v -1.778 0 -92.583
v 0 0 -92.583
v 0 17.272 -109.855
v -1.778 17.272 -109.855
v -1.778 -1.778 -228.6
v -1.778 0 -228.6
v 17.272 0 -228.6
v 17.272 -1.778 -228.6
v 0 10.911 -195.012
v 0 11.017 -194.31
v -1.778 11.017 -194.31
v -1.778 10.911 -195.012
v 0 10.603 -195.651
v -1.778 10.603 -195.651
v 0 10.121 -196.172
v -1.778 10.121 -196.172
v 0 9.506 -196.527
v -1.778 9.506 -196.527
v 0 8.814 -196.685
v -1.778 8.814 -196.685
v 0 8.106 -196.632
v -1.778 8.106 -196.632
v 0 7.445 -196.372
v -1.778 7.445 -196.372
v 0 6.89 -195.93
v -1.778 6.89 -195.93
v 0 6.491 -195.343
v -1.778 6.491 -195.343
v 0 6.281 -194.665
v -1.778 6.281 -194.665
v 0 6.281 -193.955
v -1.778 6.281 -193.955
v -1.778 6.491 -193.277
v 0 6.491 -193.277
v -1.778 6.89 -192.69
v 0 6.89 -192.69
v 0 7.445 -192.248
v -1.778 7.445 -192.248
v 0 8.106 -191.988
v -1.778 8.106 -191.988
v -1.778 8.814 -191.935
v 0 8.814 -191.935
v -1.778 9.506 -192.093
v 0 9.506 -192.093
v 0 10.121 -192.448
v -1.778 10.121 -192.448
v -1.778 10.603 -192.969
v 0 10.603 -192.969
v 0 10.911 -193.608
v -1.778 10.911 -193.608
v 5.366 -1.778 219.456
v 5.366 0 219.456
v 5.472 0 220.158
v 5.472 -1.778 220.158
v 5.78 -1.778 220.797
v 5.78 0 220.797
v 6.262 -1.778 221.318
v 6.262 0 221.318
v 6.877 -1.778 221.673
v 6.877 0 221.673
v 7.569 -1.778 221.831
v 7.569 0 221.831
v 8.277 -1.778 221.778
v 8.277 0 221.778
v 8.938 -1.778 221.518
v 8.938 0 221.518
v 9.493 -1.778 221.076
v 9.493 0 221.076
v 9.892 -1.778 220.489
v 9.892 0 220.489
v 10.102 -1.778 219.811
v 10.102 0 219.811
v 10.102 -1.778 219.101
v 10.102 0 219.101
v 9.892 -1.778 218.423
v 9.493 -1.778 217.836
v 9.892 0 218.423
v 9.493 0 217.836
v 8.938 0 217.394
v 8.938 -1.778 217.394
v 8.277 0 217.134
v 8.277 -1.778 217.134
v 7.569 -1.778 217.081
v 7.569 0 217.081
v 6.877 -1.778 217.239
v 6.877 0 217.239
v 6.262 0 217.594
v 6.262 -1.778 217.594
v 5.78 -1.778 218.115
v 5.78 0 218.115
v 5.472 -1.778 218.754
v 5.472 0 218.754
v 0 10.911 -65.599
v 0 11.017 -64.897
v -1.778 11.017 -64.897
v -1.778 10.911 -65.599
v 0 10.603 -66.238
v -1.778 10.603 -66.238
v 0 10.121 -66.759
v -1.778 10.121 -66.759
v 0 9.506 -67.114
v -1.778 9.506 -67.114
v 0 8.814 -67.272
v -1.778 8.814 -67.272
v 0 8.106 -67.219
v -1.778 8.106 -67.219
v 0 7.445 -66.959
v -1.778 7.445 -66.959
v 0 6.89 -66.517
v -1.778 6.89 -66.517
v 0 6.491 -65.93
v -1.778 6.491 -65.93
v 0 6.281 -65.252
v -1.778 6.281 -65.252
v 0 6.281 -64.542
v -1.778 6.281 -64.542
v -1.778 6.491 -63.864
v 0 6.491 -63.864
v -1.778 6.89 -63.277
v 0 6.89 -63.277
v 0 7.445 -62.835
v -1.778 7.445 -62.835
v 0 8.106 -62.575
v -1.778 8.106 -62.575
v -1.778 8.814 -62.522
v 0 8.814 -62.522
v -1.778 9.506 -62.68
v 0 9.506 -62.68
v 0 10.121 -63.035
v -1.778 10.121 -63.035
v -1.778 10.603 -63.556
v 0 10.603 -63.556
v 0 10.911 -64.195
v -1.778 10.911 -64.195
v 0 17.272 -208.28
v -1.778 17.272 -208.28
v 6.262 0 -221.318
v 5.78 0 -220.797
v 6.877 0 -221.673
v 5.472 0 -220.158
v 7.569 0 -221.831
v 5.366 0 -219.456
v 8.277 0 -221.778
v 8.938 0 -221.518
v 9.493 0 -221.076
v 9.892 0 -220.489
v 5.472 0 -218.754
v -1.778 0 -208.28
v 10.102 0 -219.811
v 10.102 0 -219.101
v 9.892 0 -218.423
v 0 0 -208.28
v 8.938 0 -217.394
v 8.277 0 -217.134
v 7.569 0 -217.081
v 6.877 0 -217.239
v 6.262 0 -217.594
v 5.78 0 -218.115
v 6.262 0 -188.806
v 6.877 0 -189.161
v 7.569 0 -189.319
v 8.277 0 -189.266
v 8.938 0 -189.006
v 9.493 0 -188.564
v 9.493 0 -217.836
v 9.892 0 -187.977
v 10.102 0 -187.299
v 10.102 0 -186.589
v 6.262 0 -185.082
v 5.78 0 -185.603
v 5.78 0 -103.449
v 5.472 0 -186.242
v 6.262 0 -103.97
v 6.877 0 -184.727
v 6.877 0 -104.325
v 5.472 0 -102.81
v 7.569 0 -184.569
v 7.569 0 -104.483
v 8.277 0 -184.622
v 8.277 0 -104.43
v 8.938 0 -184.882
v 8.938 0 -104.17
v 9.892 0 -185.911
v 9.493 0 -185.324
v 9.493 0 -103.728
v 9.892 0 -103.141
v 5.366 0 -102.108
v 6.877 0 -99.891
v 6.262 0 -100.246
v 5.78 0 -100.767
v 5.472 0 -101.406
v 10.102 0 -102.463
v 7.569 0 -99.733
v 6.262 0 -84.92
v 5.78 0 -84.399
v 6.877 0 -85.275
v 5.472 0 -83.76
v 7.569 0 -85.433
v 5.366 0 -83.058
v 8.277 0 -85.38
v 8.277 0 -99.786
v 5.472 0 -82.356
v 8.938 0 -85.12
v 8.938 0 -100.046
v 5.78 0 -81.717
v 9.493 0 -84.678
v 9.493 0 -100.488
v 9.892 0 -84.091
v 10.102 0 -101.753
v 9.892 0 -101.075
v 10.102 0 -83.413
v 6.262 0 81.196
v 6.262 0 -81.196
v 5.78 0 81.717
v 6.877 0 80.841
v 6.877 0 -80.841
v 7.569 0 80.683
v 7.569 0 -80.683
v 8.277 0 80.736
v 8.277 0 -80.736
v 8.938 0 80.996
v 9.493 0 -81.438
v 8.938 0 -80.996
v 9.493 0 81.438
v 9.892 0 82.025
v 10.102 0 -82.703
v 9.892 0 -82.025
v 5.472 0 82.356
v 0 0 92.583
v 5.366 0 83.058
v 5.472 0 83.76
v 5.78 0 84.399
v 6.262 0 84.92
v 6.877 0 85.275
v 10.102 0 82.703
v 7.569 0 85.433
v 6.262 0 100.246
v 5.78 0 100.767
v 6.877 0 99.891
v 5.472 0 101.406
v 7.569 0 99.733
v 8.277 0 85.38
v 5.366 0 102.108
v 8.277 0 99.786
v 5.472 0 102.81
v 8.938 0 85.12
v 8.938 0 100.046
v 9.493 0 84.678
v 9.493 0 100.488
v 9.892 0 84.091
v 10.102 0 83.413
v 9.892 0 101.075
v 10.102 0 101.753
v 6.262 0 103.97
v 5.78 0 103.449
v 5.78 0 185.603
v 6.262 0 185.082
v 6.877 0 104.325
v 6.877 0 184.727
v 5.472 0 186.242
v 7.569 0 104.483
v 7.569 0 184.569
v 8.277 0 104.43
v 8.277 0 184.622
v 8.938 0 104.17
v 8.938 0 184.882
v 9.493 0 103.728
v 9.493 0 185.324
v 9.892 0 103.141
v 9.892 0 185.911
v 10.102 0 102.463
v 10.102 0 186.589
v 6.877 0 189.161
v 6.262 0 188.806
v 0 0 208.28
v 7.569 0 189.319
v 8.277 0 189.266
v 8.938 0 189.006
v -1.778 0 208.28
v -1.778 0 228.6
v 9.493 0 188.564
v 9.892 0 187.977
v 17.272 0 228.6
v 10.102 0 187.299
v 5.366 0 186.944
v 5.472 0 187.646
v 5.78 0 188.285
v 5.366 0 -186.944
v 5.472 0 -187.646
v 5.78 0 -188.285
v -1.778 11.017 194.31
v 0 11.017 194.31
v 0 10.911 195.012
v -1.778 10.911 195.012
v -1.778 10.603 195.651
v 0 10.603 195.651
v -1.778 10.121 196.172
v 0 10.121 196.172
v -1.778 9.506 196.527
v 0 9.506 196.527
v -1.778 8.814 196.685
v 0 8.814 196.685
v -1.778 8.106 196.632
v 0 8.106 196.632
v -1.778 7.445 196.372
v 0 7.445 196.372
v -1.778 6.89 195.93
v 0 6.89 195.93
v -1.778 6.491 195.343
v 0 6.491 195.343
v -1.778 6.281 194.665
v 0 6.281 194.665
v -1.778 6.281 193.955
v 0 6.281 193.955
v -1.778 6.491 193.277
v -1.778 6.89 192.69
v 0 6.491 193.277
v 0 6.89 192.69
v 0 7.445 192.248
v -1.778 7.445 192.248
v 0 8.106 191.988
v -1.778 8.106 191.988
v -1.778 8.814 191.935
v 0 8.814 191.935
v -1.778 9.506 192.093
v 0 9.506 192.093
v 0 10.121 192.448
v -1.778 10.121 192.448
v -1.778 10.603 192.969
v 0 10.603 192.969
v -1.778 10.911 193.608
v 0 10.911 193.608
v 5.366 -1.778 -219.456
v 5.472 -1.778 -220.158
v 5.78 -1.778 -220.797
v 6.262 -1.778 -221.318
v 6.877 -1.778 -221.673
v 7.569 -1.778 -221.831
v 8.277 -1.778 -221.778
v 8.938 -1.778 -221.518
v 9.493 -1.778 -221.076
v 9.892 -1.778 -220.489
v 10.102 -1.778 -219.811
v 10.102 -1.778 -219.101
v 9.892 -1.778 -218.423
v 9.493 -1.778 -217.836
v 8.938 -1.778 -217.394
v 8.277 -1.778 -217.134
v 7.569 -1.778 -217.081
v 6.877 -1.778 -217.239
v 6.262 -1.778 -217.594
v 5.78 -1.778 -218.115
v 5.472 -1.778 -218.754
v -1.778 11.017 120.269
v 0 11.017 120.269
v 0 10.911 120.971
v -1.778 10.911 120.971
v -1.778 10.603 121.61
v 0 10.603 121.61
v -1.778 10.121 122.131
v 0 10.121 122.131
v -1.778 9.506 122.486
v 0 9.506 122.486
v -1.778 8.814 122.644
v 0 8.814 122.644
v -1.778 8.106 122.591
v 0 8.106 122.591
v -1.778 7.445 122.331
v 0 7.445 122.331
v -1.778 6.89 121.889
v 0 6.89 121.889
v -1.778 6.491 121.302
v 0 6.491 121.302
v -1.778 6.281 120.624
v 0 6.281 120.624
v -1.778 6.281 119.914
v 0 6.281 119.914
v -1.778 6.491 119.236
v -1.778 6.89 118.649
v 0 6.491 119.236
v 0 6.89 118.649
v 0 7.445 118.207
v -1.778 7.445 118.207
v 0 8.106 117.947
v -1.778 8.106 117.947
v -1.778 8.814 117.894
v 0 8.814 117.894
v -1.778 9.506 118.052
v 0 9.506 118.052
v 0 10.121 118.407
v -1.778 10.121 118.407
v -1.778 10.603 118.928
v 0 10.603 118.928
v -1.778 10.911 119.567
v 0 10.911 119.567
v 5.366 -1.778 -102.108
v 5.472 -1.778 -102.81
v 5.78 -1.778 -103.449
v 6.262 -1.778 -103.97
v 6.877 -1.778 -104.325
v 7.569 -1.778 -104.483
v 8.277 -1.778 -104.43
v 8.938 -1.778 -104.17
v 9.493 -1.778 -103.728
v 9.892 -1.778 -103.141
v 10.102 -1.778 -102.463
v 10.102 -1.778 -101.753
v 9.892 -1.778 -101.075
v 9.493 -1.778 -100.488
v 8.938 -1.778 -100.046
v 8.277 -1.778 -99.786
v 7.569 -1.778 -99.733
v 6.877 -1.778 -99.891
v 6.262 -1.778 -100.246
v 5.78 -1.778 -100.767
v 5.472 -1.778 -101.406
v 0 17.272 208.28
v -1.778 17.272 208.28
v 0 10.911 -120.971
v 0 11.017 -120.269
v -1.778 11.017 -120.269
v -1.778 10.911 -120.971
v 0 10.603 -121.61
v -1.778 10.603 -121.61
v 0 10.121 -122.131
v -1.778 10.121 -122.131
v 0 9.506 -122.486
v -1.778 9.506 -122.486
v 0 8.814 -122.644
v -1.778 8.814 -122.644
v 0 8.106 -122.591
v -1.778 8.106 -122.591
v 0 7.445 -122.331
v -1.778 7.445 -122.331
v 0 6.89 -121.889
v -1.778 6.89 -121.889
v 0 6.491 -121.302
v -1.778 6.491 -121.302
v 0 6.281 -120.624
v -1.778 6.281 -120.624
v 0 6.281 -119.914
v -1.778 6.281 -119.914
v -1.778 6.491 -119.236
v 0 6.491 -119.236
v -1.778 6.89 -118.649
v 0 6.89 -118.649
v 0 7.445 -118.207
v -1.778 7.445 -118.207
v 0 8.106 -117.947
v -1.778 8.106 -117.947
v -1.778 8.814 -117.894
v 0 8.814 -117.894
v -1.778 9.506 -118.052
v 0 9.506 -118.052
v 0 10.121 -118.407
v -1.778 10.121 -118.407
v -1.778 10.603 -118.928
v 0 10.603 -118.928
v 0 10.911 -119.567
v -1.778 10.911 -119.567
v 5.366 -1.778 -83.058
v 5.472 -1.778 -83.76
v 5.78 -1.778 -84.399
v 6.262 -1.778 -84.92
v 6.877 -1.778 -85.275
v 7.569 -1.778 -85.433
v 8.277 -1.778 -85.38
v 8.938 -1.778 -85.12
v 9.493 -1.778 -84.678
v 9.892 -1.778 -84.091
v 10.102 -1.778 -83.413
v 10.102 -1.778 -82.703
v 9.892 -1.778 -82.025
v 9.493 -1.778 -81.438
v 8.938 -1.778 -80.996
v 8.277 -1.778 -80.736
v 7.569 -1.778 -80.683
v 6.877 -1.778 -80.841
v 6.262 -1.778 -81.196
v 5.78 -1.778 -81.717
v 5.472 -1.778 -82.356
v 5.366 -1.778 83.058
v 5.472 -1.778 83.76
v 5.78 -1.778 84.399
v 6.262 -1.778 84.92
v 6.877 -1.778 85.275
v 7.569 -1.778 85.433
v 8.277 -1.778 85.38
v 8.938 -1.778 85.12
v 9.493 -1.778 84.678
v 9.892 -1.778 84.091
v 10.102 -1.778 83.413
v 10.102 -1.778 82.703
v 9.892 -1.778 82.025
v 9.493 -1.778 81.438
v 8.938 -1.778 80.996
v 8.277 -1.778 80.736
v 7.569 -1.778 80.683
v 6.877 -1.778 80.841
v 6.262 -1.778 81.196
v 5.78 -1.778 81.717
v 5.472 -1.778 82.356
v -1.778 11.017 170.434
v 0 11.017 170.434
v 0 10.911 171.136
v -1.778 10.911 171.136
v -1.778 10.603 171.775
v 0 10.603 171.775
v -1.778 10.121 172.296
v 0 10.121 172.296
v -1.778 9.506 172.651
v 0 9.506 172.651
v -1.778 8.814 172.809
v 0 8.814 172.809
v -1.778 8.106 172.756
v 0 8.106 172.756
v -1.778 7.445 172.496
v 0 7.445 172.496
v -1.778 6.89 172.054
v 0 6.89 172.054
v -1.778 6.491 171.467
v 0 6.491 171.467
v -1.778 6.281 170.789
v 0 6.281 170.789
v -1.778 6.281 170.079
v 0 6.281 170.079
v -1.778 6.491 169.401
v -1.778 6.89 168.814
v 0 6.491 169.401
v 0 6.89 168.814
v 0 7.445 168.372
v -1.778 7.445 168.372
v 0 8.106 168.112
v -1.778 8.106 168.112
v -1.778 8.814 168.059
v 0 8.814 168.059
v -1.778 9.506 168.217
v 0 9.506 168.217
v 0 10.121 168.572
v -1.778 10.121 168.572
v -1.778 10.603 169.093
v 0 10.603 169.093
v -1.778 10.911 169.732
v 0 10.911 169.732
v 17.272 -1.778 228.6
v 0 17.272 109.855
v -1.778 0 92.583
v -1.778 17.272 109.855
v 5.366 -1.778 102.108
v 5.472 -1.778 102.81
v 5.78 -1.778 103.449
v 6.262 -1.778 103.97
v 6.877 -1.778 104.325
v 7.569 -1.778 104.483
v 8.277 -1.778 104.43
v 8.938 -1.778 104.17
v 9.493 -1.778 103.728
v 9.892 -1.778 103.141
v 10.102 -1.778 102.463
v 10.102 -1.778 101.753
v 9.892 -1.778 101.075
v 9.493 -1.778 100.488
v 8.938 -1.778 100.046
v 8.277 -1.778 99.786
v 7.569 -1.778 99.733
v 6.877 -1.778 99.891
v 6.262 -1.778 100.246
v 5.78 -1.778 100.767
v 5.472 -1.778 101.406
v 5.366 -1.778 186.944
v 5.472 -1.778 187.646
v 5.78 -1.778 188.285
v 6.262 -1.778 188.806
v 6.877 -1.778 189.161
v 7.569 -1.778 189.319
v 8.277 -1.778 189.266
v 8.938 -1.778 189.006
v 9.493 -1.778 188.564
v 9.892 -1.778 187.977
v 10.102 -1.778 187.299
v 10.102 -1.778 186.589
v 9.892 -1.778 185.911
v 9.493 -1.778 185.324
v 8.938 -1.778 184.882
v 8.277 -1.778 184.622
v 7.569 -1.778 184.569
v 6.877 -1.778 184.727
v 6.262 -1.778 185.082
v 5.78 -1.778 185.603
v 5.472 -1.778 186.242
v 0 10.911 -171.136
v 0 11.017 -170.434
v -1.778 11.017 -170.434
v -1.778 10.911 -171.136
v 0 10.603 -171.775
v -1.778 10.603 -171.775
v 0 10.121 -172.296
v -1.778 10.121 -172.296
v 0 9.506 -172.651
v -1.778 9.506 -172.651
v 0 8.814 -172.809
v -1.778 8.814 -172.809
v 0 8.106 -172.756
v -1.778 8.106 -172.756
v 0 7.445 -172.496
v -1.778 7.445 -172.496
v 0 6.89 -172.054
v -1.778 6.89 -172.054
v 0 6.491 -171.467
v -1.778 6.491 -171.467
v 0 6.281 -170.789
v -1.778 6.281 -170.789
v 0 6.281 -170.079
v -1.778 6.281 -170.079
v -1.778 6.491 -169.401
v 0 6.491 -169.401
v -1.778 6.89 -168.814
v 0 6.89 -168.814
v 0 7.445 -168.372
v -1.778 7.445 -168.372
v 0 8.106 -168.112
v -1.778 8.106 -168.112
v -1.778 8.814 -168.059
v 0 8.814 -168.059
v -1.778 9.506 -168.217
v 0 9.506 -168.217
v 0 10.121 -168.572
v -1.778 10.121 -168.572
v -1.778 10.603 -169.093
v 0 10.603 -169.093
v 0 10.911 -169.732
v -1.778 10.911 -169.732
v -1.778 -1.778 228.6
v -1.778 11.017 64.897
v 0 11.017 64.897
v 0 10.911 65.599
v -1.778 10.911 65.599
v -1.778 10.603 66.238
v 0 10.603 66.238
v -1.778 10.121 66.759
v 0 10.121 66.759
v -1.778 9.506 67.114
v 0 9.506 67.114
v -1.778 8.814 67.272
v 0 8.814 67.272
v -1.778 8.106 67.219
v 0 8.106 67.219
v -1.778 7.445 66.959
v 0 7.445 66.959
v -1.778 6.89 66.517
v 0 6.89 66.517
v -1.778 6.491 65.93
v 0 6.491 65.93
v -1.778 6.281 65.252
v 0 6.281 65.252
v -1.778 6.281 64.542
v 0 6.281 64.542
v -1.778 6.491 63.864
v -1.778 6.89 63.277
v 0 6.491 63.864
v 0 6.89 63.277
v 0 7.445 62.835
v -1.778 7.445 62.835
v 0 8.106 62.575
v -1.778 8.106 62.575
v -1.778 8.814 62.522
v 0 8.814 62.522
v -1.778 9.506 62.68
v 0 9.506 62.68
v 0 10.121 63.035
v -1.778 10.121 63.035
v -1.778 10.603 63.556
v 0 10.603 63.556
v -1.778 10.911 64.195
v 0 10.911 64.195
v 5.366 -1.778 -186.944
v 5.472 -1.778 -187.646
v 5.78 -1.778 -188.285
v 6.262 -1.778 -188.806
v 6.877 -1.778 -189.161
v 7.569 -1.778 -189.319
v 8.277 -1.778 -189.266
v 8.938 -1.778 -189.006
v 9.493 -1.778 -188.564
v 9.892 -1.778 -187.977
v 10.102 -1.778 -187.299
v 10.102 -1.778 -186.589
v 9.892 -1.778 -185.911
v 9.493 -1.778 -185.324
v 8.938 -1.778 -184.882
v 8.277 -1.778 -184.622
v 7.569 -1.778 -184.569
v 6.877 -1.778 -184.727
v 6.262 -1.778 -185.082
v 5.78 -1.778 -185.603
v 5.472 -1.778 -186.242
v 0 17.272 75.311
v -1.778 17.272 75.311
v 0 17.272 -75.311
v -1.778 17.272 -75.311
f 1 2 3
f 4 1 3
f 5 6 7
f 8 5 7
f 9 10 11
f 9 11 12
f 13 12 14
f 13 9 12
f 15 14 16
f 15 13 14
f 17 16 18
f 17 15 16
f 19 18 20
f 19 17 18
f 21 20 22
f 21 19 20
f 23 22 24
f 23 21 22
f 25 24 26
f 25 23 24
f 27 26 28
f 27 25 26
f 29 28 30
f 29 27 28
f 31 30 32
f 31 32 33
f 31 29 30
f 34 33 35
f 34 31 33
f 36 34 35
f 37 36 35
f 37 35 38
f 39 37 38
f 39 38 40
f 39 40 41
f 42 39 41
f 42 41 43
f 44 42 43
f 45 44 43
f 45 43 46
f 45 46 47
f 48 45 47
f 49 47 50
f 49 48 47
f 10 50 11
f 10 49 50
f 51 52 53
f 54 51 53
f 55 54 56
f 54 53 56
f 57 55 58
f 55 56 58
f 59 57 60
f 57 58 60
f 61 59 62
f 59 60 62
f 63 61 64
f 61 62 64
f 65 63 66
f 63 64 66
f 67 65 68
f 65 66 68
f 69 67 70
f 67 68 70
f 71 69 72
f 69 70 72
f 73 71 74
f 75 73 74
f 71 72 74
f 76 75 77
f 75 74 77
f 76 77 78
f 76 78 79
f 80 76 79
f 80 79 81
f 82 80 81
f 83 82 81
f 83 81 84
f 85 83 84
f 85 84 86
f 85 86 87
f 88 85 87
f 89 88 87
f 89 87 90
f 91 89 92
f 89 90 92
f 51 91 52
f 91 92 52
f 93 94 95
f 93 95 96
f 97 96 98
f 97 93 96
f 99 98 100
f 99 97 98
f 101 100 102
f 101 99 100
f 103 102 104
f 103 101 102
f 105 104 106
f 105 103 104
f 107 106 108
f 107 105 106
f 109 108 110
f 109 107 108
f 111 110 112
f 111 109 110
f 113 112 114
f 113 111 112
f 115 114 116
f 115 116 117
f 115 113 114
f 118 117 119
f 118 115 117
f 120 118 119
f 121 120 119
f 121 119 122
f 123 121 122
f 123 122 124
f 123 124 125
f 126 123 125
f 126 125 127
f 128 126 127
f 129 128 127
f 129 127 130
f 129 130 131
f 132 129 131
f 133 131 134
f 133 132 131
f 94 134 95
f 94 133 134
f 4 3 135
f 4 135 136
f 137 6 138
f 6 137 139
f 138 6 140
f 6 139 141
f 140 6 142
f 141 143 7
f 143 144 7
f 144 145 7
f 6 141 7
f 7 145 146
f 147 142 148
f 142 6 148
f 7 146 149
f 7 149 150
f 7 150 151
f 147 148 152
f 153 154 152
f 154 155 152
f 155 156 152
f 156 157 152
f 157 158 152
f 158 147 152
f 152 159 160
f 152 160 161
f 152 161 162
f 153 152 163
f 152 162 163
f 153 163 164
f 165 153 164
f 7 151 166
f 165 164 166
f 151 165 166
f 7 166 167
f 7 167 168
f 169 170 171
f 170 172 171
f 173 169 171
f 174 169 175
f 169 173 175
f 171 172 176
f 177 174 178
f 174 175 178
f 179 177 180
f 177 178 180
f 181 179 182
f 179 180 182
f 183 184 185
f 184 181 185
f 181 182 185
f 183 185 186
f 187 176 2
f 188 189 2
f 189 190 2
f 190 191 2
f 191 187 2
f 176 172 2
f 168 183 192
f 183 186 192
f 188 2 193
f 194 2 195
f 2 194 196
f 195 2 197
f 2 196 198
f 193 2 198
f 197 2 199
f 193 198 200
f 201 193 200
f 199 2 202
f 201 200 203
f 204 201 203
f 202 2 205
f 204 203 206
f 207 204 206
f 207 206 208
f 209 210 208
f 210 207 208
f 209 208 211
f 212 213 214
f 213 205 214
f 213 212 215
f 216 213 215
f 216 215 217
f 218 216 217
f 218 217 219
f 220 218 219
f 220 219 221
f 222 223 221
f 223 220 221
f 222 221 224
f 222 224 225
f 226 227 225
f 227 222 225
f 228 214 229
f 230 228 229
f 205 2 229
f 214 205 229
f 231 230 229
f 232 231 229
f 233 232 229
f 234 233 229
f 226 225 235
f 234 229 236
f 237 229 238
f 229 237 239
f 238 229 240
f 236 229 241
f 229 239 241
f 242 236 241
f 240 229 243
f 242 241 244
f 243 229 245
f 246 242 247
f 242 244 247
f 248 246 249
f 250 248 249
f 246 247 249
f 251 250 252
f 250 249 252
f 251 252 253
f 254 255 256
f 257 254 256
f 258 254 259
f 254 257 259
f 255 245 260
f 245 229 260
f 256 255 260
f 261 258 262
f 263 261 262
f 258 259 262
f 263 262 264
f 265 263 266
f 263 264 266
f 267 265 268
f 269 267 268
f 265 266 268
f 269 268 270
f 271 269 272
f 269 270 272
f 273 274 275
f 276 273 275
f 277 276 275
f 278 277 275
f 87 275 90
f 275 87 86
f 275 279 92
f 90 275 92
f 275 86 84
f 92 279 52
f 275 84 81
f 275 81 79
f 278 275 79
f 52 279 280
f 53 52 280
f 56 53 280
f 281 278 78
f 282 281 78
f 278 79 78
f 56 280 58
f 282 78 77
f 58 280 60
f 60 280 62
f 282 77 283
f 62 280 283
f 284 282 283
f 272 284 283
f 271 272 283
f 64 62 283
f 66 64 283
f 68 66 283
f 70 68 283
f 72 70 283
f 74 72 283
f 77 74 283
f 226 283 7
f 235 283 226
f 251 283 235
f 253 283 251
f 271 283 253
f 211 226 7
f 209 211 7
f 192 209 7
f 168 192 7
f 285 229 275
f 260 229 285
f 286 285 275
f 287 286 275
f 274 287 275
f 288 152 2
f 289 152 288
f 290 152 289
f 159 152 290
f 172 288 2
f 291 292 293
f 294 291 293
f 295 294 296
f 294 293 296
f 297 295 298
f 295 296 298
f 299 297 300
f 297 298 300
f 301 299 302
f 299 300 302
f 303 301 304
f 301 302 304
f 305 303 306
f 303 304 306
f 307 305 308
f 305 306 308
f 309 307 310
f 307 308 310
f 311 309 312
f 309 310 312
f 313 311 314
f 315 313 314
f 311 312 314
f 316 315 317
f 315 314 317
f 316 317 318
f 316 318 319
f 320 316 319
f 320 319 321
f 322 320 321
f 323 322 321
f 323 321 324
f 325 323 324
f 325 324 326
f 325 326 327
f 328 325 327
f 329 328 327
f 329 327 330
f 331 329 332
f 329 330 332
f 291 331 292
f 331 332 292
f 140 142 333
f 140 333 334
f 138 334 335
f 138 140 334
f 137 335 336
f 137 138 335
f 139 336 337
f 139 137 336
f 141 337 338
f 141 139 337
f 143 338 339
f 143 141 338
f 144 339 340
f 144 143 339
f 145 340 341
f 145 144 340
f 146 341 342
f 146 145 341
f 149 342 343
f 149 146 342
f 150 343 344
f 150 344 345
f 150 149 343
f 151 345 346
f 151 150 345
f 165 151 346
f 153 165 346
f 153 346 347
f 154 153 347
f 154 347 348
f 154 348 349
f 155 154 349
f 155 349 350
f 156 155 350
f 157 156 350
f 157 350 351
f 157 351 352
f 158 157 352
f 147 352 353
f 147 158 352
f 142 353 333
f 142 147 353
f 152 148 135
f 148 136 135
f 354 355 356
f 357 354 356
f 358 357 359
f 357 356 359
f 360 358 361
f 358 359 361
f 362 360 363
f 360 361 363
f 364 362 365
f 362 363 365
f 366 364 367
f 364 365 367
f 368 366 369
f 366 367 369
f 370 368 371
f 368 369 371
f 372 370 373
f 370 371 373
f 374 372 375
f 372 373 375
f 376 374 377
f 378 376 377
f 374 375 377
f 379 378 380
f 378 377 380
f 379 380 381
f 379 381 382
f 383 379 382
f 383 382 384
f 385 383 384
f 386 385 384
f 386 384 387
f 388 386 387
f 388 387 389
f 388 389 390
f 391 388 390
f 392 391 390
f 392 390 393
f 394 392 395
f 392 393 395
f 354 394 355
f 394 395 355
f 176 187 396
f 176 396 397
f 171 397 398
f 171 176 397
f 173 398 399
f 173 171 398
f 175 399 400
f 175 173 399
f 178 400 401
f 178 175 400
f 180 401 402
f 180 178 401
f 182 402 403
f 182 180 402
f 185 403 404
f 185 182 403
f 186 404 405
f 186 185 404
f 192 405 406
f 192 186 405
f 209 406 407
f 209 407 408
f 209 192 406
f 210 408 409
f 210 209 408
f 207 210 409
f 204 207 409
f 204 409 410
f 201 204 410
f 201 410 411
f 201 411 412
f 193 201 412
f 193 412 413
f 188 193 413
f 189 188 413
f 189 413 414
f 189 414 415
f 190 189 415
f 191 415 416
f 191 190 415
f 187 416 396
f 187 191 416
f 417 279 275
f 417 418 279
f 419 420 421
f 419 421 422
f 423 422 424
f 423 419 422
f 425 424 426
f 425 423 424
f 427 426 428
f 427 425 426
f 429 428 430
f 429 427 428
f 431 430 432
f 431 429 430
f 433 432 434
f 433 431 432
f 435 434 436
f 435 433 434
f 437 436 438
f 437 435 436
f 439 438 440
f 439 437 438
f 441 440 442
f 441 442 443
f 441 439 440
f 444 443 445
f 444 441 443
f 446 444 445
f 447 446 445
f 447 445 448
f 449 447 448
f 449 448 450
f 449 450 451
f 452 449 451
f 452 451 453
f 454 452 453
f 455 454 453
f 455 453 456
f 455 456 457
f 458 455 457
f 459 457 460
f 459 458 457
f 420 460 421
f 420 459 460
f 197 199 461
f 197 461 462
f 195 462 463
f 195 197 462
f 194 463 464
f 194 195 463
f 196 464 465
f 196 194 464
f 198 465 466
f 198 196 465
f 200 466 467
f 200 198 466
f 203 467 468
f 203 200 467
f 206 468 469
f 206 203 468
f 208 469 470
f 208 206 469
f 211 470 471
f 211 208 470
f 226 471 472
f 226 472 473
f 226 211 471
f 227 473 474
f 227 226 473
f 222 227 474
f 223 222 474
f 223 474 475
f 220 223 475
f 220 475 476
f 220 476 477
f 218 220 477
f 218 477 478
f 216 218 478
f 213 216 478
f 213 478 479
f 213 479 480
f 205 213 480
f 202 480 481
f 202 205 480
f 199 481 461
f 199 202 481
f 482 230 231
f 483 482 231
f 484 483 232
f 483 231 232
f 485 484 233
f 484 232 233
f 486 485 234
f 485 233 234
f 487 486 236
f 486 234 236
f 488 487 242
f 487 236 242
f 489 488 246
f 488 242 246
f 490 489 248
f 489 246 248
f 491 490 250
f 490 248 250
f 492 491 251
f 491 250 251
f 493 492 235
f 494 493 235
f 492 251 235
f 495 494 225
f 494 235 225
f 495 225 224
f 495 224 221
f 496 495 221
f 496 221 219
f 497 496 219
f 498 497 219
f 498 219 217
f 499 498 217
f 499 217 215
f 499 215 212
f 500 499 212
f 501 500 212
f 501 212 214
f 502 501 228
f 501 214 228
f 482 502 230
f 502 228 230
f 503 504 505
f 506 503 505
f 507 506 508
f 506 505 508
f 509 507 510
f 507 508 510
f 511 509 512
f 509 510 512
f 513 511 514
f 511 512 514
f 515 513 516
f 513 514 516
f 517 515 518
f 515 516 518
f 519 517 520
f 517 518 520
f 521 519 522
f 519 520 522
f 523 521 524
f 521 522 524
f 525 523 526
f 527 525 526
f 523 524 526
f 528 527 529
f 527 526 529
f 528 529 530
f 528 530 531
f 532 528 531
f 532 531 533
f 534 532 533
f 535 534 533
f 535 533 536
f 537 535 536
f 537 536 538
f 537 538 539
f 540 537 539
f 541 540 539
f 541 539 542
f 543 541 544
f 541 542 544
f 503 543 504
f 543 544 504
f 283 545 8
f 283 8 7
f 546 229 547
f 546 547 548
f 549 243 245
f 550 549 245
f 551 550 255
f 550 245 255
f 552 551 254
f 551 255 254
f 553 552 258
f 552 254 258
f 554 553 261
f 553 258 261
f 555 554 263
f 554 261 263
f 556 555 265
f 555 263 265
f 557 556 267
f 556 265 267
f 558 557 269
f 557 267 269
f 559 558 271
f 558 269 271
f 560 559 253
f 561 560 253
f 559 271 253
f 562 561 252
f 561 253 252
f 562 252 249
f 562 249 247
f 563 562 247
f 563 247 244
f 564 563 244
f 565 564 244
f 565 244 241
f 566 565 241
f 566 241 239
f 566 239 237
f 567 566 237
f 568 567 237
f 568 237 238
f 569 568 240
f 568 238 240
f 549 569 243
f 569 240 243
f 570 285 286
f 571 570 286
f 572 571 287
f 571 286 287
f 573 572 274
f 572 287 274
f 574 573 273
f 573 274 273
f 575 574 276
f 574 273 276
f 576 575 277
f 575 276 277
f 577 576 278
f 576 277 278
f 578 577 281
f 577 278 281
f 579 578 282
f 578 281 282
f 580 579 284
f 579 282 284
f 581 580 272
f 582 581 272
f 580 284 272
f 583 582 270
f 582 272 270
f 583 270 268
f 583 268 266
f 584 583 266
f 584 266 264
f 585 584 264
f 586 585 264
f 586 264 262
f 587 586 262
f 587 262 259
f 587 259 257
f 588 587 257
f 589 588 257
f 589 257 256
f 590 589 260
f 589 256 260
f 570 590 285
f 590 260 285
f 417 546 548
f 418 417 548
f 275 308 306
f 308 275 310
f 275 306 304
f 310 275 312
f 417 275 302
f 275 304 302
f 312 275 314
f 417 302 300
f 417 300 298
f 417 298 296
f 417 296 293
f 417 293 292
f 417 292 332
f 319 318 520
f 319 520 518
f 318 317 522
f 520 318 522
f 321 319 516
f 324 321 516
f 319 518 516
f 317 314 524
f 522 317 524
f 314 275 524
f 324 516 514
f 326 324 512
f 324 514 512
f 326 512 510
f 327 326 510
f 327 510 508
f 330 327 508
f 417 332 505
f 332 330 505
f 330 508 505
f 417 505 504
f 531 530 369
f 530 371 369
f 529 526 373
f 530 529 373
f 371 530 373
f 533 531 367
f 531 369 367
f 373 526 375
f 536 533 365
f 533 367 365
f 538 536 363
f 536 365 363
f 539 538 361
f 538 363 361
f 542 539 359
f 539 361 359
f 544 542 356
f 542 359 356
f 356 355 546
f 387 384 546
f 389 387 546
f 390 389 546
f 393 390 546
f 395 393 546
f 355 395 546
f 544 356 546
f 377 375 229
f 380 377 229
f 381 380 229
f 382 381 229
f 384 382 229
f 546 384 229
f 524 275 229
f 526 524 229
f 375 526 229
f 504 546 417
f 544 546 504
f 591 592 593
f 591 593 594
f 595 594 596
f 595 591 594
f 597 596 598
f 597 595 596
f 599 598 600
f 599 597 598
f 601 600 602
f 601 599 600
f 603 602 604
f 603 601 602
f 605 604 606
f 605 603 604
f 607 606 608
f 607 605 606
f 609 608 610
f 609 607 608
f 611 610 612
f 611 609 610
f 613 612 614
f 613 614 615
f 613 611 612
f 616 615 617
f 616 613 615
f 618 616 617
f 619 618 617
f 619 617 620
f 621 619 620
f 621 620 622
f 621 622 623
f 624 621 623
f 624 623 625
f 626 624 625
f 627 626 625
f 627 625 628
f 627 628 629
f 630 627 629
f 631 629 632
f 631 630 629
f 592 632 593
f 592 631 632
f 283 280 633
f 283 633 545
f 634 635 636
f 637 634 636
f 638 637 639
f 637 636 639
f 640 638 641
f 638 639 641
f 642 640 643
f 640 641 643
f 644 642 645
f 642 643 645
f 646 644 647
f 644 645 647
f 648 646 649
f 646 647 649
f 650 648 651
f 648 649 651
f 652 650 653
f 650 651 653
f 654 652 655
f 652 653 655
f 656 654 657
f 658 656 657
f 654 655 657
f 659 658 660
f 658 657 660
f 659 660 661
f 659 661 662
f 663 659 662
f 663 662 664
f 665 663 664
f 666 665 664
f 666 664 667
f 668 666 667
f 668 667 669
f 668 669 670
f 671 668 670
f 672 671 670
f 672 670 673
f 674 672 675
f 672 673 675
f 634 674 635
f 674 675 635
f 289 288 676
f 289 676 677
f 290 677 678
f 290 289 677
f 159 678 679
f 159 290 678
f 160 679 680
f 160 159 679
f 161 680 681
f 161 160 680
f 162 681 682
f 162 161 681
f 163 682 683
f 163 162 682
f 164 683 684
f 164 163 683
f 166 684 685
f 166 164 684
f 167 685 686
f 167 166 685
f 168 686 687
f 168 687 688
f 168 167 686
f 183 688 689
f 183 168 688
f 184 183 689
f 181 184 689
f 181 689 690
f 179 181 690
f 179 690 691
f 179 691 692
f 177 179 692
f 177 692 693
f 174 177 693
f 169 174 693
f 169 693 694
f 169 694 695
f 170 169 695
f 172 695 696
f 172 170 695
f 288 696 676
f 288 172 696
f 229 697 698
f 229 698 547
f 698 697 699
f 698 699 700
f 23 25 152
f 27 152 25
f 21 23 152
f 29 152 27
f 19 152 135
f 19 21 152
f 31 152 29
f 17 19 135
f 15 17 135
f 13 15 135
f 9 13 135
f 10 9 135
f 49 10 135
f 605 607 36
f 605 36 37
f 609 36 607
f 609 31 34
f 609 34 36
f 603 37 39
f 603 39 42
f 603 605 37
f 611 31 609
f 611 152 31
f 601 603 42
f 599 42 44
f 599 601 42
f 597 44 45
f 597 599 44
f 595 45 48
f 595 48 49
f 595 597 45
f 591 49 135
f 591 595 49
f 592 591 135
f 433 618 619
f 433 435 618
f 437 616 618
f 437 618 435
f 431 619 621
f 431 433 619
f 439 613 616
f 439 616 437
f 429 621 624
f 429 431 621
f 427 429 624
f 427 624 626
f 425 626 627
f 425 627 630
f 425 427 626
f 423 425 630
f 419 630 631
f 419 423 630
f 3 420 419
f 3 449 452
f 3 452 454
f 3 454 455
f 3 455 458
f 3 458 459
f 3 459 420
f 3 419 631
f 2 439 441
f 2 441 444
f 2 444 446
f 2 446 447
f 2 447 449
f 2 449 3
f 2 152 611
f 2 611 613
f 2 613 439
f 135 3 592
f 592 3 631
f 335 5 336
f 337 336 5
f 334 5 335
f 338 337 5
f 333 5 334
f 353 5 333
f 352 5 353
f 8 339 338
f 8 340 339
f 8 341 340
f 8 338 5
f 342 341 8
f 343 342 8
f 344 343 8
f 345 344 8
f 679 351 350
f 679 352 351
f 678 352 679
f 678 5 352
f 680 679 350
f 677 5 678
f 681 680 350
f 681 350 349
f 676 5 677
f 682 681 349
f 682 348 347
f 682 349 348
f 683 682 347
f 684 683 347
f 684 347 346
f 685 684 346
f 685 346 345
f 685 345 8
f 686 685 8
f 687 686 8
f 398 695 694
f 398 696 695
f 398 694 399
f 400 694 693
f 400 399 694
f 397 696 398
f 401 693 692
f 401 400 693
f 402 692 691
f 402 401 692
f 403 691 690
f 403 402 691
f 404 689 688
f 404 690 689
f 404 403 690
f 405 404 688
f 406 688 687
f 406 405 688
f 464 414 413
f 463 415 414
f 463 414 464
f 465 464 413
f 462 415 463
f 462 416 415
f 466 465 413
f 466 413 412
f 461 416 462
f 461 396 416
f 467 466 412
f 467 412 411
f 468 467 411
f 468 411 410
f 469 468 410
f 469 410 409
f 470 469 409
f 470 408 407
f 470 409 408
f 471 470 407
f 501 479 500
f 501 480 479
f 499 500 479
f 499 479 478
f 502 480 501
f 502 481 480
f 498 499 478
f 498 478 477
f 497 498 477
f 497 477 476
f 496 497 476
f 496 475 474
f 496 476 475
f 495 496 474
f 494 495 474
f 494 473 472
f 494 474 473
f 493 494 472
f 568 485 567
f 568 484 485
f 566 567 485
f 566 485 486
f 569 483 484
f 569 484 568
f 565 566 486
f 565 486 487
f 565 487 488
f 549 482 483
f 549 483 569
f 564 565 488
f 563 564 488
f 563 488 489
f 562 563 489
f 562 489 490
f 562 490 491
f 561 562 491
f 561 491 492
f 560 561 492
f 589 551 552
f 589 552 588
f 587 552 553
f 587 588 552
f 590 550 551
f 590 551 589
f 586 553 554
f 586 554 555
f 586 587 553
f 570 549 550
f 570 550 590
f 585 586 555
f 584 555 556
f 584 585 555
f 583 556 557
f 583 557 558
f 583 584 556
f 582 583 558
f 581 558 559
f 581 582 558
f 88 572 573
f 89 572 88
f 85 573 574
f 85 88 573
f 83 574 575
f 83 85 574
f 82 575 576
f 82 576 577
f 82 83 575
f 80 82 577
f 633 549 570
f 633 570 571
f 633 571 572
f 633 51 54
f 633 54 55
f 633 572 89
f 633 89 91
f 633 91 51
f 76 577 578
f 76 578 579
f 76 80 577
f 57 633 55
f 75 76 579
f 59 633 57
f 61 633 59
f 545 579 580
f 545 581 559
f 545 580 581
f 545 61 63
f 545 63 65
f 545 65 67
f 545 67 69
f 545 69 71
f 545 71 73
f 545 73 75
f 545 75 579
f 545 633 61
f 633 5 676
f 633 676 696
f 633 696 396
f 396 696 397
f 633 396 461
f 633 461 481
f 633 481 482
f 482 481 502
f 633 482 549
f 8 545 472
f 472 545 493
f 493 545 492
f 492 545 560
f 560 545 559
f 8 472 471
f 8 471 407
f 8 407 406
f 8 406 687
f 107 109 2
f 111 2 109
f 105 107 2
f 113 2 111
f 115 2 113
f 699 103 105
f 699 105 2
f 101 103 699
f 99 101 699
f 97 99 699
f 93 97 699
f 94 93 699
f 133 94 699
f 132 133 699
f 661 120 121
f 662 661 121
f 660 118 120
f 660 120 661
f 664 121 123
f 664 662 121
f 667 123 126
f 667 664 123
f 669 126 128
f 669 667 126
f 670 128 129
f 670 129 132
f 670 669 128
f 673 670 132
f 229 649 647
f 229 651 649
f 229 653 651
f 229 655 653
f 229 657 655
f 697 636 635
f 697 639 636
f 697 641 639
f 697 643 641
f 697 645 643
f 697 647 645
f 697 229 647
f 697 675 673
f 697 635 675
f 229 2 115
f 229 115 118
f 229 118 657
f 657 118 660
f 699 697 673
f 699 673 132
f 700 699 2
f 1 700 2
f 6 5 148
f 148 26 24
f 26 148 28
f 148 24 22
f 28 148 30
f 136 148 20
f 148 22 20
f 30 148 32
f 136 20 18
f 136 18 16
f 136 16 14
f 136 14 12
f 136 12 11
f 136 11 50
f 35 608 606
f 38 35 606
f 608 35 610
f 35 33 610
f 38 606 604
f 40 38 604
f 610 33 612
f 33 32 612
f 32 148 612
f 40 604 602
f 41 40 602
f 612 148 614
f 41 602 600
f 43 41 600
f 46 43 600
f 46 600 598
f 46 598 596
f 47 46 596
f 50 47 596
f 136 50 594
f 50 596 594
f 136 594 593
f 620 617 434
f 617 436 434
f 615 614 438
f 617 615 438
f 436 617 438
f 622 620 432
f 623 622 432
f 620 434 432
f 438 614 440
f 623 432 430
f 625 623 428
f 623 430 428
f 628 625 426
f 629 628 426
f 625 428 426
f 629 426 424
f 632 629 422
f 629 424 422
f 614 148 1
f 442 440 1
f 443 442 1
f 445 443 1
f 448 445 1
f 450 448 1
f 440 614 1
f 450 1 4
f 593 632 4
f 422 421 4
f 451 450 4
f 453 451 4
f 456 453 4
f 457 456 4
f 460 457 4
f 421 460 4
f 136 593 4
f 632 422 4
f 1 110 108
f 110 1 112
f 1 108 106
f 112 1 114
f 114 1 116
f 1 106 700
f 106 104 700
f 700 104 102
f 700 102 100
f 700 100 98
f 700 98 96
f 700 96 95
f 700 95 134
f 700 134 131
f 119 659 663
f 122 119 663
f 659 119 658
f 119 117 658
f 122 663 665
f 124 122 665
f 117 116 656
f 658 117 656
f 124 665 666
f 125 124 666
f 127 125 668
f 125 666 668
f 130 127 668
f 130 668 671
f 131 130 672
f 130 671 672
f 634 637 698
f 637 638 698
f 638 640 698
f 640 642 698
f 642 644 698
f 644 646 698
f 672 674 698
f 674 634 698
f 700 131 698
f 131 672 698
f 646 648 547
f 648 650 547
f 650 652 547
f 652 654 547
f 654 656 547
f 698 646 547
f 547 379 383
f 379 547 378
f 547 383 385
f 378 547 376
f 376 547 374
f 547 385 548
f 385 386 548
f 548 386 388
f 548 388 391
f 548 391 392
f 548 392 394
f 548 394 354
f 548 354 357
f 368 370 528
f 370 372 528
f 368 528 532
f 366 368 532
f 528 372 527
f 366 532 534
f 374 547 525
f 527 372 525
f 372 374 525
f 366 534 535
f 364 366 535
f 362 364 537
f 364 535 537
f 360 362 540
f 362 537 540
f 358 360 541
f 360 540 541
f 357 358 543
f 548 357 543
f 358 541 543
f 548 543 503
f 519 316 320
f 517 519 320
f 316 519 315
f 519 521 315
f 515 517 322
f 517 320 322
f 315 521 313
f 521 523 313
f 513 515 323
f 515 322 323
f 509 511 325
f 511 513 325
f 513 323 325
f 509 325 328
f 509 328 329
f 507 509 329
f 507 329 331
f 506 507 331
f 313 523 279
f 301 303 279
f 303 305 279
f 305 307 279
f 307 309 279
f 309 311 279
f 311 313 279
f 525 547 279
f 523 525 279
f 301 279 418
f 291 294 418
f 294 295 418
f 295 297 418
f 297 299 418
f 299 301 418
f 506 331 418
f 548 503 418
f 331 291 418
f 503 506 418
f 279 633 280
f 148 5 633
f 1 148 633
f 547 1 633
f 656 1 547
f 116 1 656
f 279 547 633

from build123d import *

# Parameters (mm, degrees)
BOSS_EXTRUDE1_DEPTH = 208.28
SKETCH2_R           = 2.38125
CUT_EXTRUDE1_DEPTH  = 1.778
SKETCH3_W           = 19.05
SKETCH3_H           = 1.778
BOSS_EXTRUDE2_DEPTH = 20.32
SKETCH4_R           = 2.38125
CUT_EXTRUDE2_DEPTH  = 1.778


with BuildPart() as part:
    # Sketch1 → Boss-Extrude1 (new body)
    with BuildSketch(Plane.XY):
        Polygon((0, 0), (0, 17.272), (-1.778, 17.272), (-1.778, -1.778), (17.272, -1.778), (17.272, 0), align=None)
    boss_extrude1 = extrude(amount=BOSS_EXTRUDE1_DEPTH)

    # Sketch2 → Cut-Extrude1 (cut)
    with BuildSketch(Plane(origin=(0, 0, 0), x_dir=(0, 0, -1), z_dir=(1, 0, 0))):
        with Locations(Location((-194.31, 8.636, 0), (0, 0, 90))):
            Circle(SKETCH2_R)
        with Locations(Location((-170.434, 8.636, 0), (0, 0, 90))):
            Circle(SKETCH2_R)
        with Locations(Location((-120.269, 8.636, 0), (0, 0, 90))):
            Circle(SKETCH2_R)
        with Locations(Location((-64.897, 8.636, 0), (0, 0, 90))):
            Circle(SKETCH2_R)
        Polygon((-92.583, 0), (-109.855, 17.272), (-75.311, 17.272), align=None)
    cut_extrude1 = extrude(amount=-CUT_EXTRUDE1_DEPTH, mode=Mode.SUBTRACT)

    # Sketch3 → Boss-Extrude2 (add)
    with BuildSketch(Plane.XY.offset(208.28)):
        with Locations((7.747, -0.889)):
            Rectangle(SKETCH3_W, SKETCH3_H)
    boss_extrude2 = extrude(amount=BOSS_EXTRUDE2_DEPTH)

    # Sketch4 → Cut-Extrude2 (cut)
    with BuildSketch(Plane(origin=(0, 0, 0), x_dir=(1, 0, 0), z_dir=(0, 1, 0))):
        with Locations(Location((7.747, -219.456, 0), (0, 0, 180))):
            Circle(SKETCH4_R)
        with Locations(Location((7.747, -83.058, 0), (0, 0, 180))):
            Circle(SKETCH4_R)
        with Locations(Location((7.747, -102.108, 0), (0, 0, 180))):
            Circle(SKETCH4_R)
        with Locations(Location((7.747, -186.944, 0), (0, 0, 180))):
            Circle(SKETCH4_R)
    cut_extrude2 = extrude(amount=-CUT_EXTRUDE2_DEPTH, mode=Mode.SUBTRACT)

    # Mirror3: Boss-Extrude1, Cut-Extrude1, Boss-Extrude2, Cut-Extrude2 across plane
    add(boss_extrude1.mirror(Plane(origin=(0, 0, 0), x_dir=(1, 0, 0), z_dir=(0, 0, -1))))
    add(cut_extrude1.mirror(Plane(origin=(0, 0, 0), x_dir=(1, 0, 0), z_dir=(0, 0, -1))), mode=Mode.SUBTRACT)
    add(boss_extrude2.mirror(Plane(origin=(0, 0, 0), x_dir=(1, 0, 0), z_dir=(0, 0, -1))))
    add(cut_extrude2.mirror(Plane(origin=(0, 0, 0), x_dir=(1, 0, 0), z_dir=(0, 0, -1))), mode=Mode.SUBTRACT)


solid = part.part
